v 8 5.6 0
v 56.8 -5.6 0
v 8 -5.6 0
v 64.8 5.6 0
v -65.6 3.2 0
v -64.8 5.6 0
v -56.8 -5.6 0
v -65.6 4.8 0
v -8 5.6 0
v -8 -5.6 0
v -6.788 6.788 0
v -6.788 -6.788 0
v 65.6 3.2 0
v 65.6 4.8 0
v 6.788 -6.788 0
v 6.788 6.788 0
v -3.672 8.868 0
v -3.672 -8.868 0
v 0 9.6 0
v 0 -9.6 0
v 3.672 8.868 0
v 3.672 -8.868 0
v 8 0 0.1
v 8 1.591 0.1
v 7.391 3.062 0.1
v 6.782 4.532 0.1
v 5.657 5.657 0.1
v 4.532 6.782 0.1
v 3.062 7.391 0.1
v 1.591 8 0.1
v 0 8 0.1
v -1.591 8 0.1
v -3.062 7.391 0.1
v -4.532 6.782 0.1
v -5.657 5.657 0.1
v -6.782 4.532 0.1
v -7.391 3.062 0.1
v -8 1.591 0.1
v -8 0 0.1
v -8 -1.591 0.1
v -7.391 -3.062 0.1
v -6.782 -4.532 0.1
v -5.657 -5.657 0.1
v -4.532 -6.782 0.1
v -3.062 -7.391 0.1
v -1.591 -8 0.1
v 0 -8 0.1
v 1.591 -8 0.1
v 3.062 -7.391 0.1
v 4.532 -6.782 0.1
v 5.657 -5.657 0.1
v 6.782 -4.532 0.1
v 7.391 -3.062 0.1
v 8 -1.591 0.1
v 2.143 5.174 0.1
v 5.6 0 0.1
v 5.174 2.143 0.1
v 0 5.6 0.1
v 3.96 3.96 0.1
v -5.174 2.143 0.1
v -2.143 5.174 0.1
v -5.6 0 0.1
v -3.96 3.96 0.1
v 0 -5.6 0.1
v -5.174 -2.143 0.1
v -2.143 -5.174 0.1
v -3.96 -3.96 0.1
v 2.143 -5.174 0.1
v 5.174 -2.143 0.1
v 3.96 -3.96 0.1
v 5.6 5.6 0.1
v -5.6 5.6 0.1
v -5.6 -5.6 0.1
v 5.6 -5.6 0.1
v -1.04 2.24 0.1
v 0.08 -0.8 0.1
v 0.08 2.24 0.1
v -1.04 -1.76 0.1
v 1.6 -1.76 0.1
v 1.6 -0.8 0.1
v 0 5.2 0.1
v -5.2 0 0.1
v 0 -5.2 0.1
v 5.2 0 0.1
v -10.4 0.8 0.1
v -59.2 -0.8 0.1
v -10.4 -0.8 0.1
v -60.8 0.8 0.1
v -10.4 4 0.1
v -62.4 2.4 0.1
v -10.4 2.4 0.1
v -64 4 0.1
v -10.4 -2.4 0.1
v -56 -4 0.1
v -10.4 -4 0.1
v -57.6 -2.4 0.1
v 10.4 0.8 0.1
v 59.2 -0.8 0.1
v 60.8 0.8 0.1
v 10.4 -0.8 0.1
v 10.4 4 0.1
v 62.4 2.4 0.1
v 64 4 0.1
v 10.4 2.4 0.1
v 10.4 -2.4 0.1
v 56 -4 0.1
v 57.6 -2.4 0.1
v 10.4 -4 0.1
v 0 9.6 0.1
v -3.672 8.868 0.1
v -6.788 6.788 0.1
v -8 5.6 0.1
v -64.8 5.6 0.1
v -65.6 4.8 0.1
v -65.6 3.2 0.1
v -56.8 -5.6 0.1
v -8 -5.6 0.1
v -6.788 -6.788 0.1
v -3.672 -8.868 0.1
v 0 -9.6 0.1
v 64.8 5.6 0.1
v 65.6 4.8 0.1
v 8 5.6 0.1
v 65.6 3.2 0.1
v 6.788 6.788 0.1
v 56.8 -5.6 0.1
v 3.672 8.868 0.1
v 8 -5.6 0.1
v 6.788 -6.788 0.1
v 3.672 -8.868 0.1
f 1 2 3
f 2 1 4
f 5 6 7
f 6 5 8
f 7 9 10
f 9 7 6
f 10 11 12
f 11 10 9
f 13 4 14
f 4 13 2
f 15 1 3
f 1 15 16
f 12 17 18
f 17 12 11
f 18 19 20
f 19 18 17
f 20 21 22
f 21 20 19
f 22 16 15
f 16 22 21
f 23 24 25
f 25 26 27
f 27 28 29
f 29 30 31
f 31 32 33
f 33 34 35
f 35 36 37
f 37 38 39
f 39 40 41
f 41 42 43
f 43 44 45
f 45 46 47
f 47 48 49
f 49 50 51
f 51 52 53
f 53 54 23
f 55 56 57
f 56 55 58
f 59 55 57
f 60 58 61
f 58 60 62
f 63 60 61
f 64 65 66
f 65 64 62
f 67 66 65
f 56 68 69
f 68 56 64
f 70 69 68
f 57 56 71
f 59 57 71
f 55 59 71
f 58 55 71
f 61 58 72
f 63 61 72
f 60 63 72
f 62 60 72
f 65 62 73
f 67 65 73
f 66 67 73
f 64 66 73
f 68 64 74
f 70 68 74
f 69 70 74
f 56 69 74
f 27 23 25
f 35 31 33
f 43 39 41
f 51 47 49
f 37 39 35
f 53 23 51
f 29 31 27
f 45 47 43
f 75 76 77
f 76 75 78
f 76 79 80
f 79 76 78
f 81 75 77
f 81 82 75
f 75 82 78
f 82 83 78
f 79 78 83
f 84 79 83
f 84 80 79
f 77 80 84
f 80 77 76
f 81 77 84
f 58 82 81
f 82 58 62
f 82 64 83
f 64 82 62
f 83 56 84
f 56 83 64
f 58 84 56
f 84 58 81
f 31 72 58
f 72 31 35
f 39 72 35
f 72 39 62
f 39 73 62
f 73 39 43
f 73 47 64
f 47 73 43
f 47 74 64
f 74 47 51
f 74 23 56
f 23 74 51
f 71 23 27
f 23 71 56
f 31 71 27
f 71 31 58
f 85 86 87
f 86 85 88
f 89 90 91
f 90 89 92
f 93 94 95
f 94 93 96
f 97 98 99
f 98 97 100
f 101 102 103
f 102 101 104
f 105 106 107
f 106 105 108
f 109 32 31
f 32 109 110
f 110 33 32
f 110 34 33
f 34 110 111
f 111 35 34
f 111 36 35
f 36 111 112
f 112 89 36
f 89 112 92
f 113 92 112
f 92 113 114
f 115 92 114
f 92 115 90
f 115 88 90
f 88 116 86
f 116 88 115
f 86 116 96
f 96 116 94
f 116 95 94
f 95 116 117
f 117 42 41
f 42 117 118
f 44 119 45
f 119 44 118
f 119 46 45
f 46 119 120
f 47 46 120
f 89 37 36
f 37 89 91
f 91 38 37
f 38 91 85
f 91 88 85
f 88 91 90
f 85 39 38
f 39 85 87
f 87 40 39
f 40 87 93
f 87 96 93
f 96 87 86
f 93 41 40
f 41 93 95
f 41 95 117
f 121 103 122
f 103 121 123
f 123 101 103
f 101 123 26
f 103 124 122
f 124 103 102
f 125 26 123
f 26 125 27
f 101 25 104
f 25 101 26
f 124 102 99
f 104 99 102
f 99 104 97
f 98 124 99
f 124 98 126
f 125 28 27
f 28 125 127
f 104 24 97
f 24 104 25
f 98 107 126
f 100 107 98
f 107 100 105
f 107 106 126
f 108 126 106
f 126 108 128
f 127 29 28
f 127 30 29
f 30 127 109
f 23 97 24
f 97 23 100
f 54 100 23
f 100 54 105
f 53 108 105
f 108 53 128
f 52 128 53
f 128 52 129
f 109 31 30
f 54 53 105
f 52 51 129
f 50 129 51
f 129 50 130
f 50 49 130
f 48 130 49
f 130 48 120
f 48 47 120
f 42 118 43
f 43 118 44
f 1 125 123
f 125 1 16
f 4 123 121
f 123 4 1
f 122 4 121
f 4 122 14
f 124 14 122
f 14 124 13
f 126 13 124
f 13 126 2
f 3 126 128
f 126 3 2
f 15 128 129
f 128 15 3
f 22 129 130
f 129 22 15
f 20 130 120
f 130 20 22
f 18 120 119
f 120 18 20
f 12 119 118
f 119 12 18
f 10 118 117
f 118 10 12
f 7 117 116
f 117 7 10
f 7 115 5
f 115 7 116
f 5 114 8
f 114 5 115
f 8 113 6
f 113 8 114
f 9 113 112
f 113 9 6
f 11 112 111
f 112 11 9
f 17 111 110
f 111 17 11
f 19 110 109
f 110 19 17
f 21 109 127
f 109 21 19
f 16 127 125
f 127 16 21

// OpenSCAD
// file: ../p/4-4ndis.scad
use <../lib.scad>
function ldraw_lib__4_4ndis() = [
// 0 Disc Negative 1.0
// 0 Name: 4-4ndis.dat
// 0 Author: James Jessiman
// 0 !LDRAW_ORG Primitive UPDATE 2012-01
// 0 !LICENSE Licensed under CC BY 4.0 : see CAreadme.txt
// 
// 0 BFC CERTIFY CCW
  [0,"BFC","CERTIFY"],
  [0,"BFC","CCW"],
// 
// 0 !HISTORY 2002-03-23 [sbliss] Added BFC statement; compacted code
// 0 !HISTORY 2002-04-25 [PTadmin] Official Update 2002-02
// 0 !HISTORY 2007-06-24 [PTadmin] Header formatted for Contributor Agreement
// 0 !HISTORY 2008-07-01 [PTadmin] Official Update 2008-01
// 0 !HISTORY 2012-02-16 [Philo] Changed to CCW
// 0 !HISTORY 2012-03-30 [PTadmin] Official Update 2012-01
// 
// 
// 3 16 0.9239 0 0.3827 1 0 0 1 0 1
  [3,16,0.9239,0,0.3827,1,0,0,1,0,1],
// 3 16 0.7071 0 0.7071 0.9239 0 0.3827 1 0 1
  [3,16,0.7071,0,0.7071,0.9239,0,0.3827,1,0,1],
// 3 16 0.3827 0 0.9239 0.7071 0 0.7071 1 0 1
  [3,16,0.3827,0,0.9239,0.7071,0,0.7071,1,0,1],
// 3 16 0 0 1 0.3827 0 0.9239 1 0 1
  [3,16,0,0,1,0.3827,0,0.9239,1,0,1],
// 3 16 -0.3827 0 0.9239 0 0 1 -1 0 1
  [3,16,-0.3827,0,0.9239,0,0,1,-1,0,1],
// 3 16 -0.7071 0 0.7071 -0.3827 0 0.9239 -1 0 1
  [3,16,-0.7071,0,0.7071,-0.3827,0,0.9239,-1,0,1],
// 3 16 -0.9239 0 0.3827 -0.7071 0 0.7071 -1 0 1
  [3,16,-0.9239,0,0.3827,-0.7071,0,0.7071,-1,0,1],
// 3 16 -1 0 0 -0.9239 0 0.3827 -1 0 1
  [3,16,-1,0,0,-0.9239,0,0.3827,-1,0,1],
// 3 16 -0.9239 0 -0.3827 -1 0 0 -1 0 -1
  [3,16,-0.9239,0,-0.3827,-1,0,0,-1,0,-1],
// 3 16 -0.7071 0 -0.7071 -0.9239 0 -0.3827 -1 0 -1
  [3,16,-0.7071,0,-0.7071,-0.9239,0,-0.3827,-1,0,-1],
// 3 16 -0.3827 0 -0.9239 -0.7071 0 -0.7071 -1 0 -1
  [3,16,-0.3827,0,-0.9239,-0.7071,0,-0.7071,-1,0,-1],
// 3 16 0 0 -1 -0.3827 0 -0.9239 -1 0 -1
  [3,16,0,0,-1,-0.3827,0,-0.9239,-1,0,-1],
// 3 16 0.3827 0 -0.9239 0 0 -1 1 0 -1
  [3,16,0.3827,0,-0.9239,0,0,-1,1,0,-1],
// 3 16 0.7071 0 -0.7071 0.3827 0 -0.9239 1 0 -1
  [3,16,0.7071,0,-0.7071,0.3827,0,-0.9239,1,0,-1],
// 3 16 0.9239 0 -0.3827 0.7071 0 -0.7071 1 0 -1
  [3,16,0.9239,0,-0.3827,0.7071,0,-0.7071,1,0,-1],
// 3 16 1 0 0 0.9239 0 -0.3827 1 0 -1
  [3,16,1,0,0,0.9239,0,-0.3827,1,0,-1],
];
module ldraw_lib__4_4ndis(step=0, col=false, unit=2/5, alt=false, line=0.2, solid=!$preview)
    makepoly(ldraw_lib__4_4ndis(), step=step, col=col, unit=unit, alt=alt, line=line, solid=solid);
ldraw_lib__4_4ndis(line=0.2);
// file: ../p/1-8chrd.scad
use <../lib.scad>
function ldraw_lib__1_8chrd() = [
// 0 Chord 0.125
// 0 Name: 1-8chrd.dat
// 0 Author: Orion Pobursky [OrionP]
// 0 !LDRAW_ORG Primitive UPDATE 2023-05
// 0 !LICENSE Licensed under CC BY 4.0 : see CAreadme.txt
// 
// 0 BFC CERTIFY CCW
  [0,"BFC","CERTIFY"],
  [0,"BFC","CCW"],
// 
// 0 !HISTORY 2004-04-22 [PTadmin] Official Update 2004-02
// 0 !HISTORY 2007-06-22 [PTadmin] Header formatted for Contributor Agreement
// 0 !HISTORY 2008-07-01 [PTadmin] Official Update 2008-01
// 0 !HISTORY 2023-10-27 [OrionP] Rebuilt with PrimGen2, original author westrate
// 0 !HISTORY 2023-10-31 [OrionP] Official Update 2023-05
// 
// 3 16 1 0 0 0.9239 0 0.3827 0.7071 0 0.7071
  [3,16,1,0,0,0.9239,0,0.3827,0.7071,0,0.7071],
];
module ldraw_lib__1_8chrd(step=0, col=false, unit=2/5, alt=false, line=0.2, solid=!$preview)
    makepoly(ldraw_lib__1_8chrd(), step=step, col=col, unit=unit, alt=alt, line=line, solid=solid);
ldraw_lib__1_8chrd(line=0.2);
// file: ../p/1-4tang.scad
use <../lib.scad>
function ldraw_lib__1_4tang() = [
// 0 Disc Negative Tangent 0.25
// 0 Name: 1-4tang.dat
// 0 Author: Willy Tschager [Holly-Wood]
// 0 !LDRAW_ORG Primitive UPDATE 2024-01
// 0 !LICENSE Licensed under CC BY 4.0 : see CAreadme.txt
// 
// 0 BFC CERTIFY CCW
  [0,"BFC","CERTIFY"],
  [0,"BFC","CCW"],
// 
// 0 !HISTORY 2011-12-29 [PTadmin] Official Update 2011-02
// 0 !HISTORY 2024-01-08 [Holly-Wood] Complete re-write, original by westrate
// 0 !HISTORY 2024-01-29 [OrionP] Official Update 2024-01
// 
// 3 16 0 0 1 0.3827 0 0.9239 0.1989 0 1
  [3,16,0,0,1,0.3827,0,0.9239,0.1989,0,1],
// 3 16 0.3827 0 0.9239 0.7071 0 0.7071 0.5665 0 0.8478
  [3,16,0.3827,0,0.9239,0.7071,0,0.7071,0.5665,0,0.8478],
// 3 16 0.7071 0 0.7071 0.9239 0 0.3827 0.8478 0 0.5665
  [3,16,0.7071,0,0.7071,0.9239,0,0.3827,0.8478,0,0.5665],
// 3 16 0.9239 0 0.3827 1 0 0 1 0 0.1989
  [3,16,0.9239,0,0.3827,1,0,0,1,0,0.1989],
];
module ldraw_lib__1_4tang(step=0, col=false, unit=2/5, alt=false, line=0.2, solid=!$preview)
    makepoly(ldraw_lib__1_4tang(), step=step, col=col, unit=unit, alt=alt, line=line, solid=solid);
ldraw_lib__1_4tang(line=0.2);
// file: ../p/1-4chrd.scad
use <../lib.scad>
function ldraw_lib__1_4chrd() = [
// 0 Chord 0.25
// 0 Name: 1-4chrd.dat
// 0 Author: Max Martin Richter [MMR1988]
// 0 !LDRAW_ORG Primitive UPDATE 2023-05
// 0 !LICENSE Licensed under CC BY 4.0 : see CAreadme.txt
// 
// 0 BFC CERTIFY CCW
  [0,"BFC","CERTIFY"],
  [0,"BFC","CCW"],
// 
// 0 !HISTORY 2004-04-22 [PTadmin] Official Update 2004-02
// 0 !HISTORY 2007-10-09 [PTadmin] Header formatted for Contributor Agreement
// 0 !HISTORY 2008-07-01 [PTadmin] Official Update 2008-01
// 0 !HISTORY 2012-08-02 [MMR1988] Re-creation with PrimGen2 and Rectifier
// 0 !HISTORY 2012-08-09 [PTadmin] Official Update 2012-02
// 0 !HISTORY 2023-10-27 [OrionP] Change author to MMR1988 from hafhead
// 0 !HISTORY 2023-10-31 [OrionP] Official Update 2023-05
// 
// 4 16 0.9239 0 0.3827 0.3827 0 0.9239 0 0 1 1 0 0
  [4,16,0.9239,0,0.3827,0.3827,0,0.9239,0,0,1,1,0,0],
// 3 16 0.7071 0 0.7071 0.3827 0 0.9239 0.9239 0 0.3827
  [3,16,0.7071,0,0.7071,0.3827,0,0.9239,0.9239,0,0.3827],
];
module ldraw_lib__1_4chrd(step=0, col=false, unit=2/5, alt=false, line=0.2, solid=!$preview)
    makepoly(ldraw_lib__1_4chrd(), step=step, col=col, unit=unit, alt=alt, line=line, solid=solid);
ldraw_lib__1_4chrd(line=0.2);
// main file
use <../lib.scad>
use <../p/1-4chrd.scad>
use <../p/1-4tang.scad>
use <../p/1-8chrd.scad>
use <../p/4-4ndis.scad>
function ldraw_lib__197895a() = [
// 0 Sticker  2.5 x 16.4 with White Stripes and Red "L" in White/Black/Yellow Logo
// 0 Name: 197895a.dat
// 0 Author: Takeshi Takahashi [RainbowDolphin]
// 0 !LDRAW_ORG Part UPDATE 2025-08
// 0 !LICENSE Licensed under CC BY 4.0 : see CAreadme.txt
// 
// 0 BFC CERTIFY CCW
  [0,"BFC","CERTIFY"],
  [0,"BFC","CCW"],
// 
// 0 !KEYWORDS boat, Cargo, Freighter, Set 4030, ship
// 
// 0 !HISTORY 2025-08-31 [OrionP] Official Update 2025-08
// 
// 
// 4 16 142 0 -14 20 0 -14 20 0 14 162 0 14
  [4,16,142,0,-14,20,0,-14,20,0,14,162,0,14],
// 4 16 -164 0 12 -162 0 14 -142 0 -14 -164 0 8
  [4,16,-164,0,12,-162,0,14,-142,0,-14,-164,0,8],
// 4 16 -142 0 -14 -162 0 14 -20 0 14 -20 0 -14
  [4,16,-142,0,-14,-162,0,14,-20,0,14,-20,0,-14],
// 4 16 -20 0 14 -16.97 0 16.97 -16.97 0 -16.97 -20 0 -14
  [4,16,-20,0,14,-16.97,0,16.97,-16.97,0,-16.97,-20,0,-14],
// 4 16 142 0 -14 162 0 14 164 0 12 164 0 8
  [4,16,142,0,-14,162,0,14,164,0,12,164,0,8],
// 4 16 16.97 0 16.97 20 0 14 20 0 -14 16.97 0 -16.97
  [4,16,16.97,0,16.97,20,0,14,20,0,-14,16.97,0,-16.97],
// 4 16 -16.97 0 -16.97 -16.97 0 16.97 -9.18 0 22.17 -9.18 0 -22.17
  [4,16,-16.97,0,-16.97,-16.97,0,16.97,-9.18,0,22.17,-9.18,0,-22.17],
// 4 16 0 0 24 0 0 -24 -9.18 0 -22.17 -9.18 0 22.17
  [4,16,0,0,24,0,0,-24,-9.18,0,-22.17,-9.18,0,22.17],
// 4 16 9.18 0 22.17 9.18 0 -22.17 0 0 -24 0 0 24
  [4,16,9.18,0,22.17,9.18,0,-22.17,0,0,-24,0,0,24],
// 4 16 9.18 0 -22.17 9.18 0 22.17 16.97 0 16.97 16.97 0 -16.97
  [4,16,9.18,0,-22.17,9.18,0,22.17,16.97,0,16.97,16.97,0,-16.97],
// 1 16 0 -.25 0 20 0 0 0 1 0 0 0 20 1-4tang.dat
  [1,16,0,-.25,0,20,0,0,0,1,0,0,0,20, ldraw_lib__1_4tang()],
// 1 16 0 -.25 0 0 0 -20 0 1 0 20 0 0 1-4tang.dat
  [1,16,0,-.25,0,0,0,-20,0,1,0,20,0,0, ldraw_lib__1_4tang()],
// 1 16 0 -.25 0 -20 0 0 0 1 0 0 0 -20 1-4tang.dat
  [1,16,0,-.25,0,-20,0,0,0,1,0,0,0,-20, ldraw_lib__1_4tang()],
// 1 16 0 -.25 0 0 0 20 0 1 0 -20 0 0 1-4tang.dat
  [1,16,0,-.25,0,0,0,20,0,1,0,-20,0,0, ldraw_lib__1_4tang()],
// 0 BFC NOCLIP
  [0,"BFC","NOCLIP"],
// 1 0 0 -.25 0 14 0 0 0 1 0 0 0 14 1-4chrd.dat
  [1,0,0,-.25,0,14,0,0,0,1,0,0,0,14, ldraw_lib__1_4chrd()],
// 1 0 0 -.25 0 0 0 -14 0 1 0 14 0 0 1-4chrd.dat
  [1,0,0,-.25,0,0,0,-14,0,1,0,14,0,0, ldraw_lib__1_4chrd()],
// 1 0 0 -.25 0 -14 0 0 0 1 0 0 0 -14 1-4chrd.dat
  [1,0,0,-.25,0,-14,0,0,0,1,0,0,0,-14, ldraw_lib__1_4chrd()],
// 1 0 0 -.25 0 0 0 14 0 1 0 -14 0 0 1-4chrd.dat
  [1,0,0,-.25,0,0,0,14,0,1,0,-14,0,0, ldraw_lib__1_4chrd()],
// 1 14 0 -.25 0 14 0 0 0 1 0 0 0 14 4-4ndis.dat
  [1,14,0,-.25,0,14,0,0,0,1,0,0,0,14, ldraw_lib__4_4ndis()],
// 1 14 0 -.25 0 20 0 0 0 1 0 0 0 20 1-8chrd.dat
  [1,14,0,-.25,0,20,0,0,0,1,0,0,0,20, ldraw_lib__1_8chrd()],
// 1 14 0 -.25 0 0 0 -20 0 1 0 20 0 0 1-8chrd.dat
  [1,14,0,-.25,0,0,0,-20,0,1,0,20,0,0, ldraw_lib__1_8chrd()],
// 1 14 0 -.25 0 -20 0 0 0 1 0 0 0 -20 1-8chrd.dat
  [1,14,0,-.25,0,-20,0,0,0,1,0,0,0,-20, ldraw_lib__1_8chrd()],
// 1 14 0 -.25 0 0 0 20 0 1 0 -20 0 0 1-8chrd.dat
  [1,14,0,-.25,0,0,0,20,0,1,0,-20,0,0, ldraw_lib__1_8chrd()],
// 1 14 0 -.25 0 -20 0 0 0 1 0 0 0 20 1-8chrd.dat
  [1,14,0,-.25,0,-20,0,0,0,1,0,0,0,20, ldraw_lib__1_8chrd()],
// 1 14 0 -.25 0 20 0 0 0 1 0 0 0 -20 1-8chrd.dat
  [1,14,0,-.25,0,20,0,0,0,1,0,0,0,-20, ldraw_lib__1_8chrd()],
// 1 14 0 -.25 0 0 0 20 0 1 0 20 0 0 1-8chrd.dat
  [1,14,0,-.25,0,0,0,20,0,1,0,20,0,0, ldraw_lib__1_8chrd()],
// 1 14 0 -.25 0 0 0 -20 0 1 0 -20 0 0 1-8chrd.dat
  [1,14,0,-.25,0,0,0,-20,0,1,0,-20,0,0, ldraw_lib__1_8chrd()],
// 4 4 .2 -.25 -2 .2 -.25 5.6 -2.6 -.25 5.6 -2.6 -.25 -4.4
  [4,4,.2,-.25,-2,.2,-.25,5.6,-2.6,-.25,5.6,-2.6,-.25,-4.4],
// 4 4 .2 -.25 -2 -2.6 -.25 -4.4 4 -.25 -4.4 4 -.25 -2
  [4,4,.2,-.25,-2,-2.6,-.25,-4.4,4,-.25,-4.4,4,-.25,-2],
// 3 15 0 -.25 13 -2.6 -.25 5.6 .2 -.25 5.6
  [3,15,0,-.25,13,-2.6,-.25,5.6,.2,-.25,5.6],
// 3 15 0 -.25 13 -13 -.25 0 -2.6 -.25 5.6
  [3,15,0,-.25,13,-13,-.25,0,-2.6,-.25,5.6],
// 3 15 -2.6 -.25 5.6 -13 -.25 0 -2.6 -.25 -4.4
  [3,15,-2.6,-.25,5.6,-13,-.25,0,-2.6,-.25,-4.4],
// 3 15 -13 -.25 0 0 -.25 -13 -2.6 -.25 -4.4
  [3,15,-13,-.25,0,0,-.25,-13,-2.6,-.25,-4.4],
// 3 15 4 -.25 -4.4 -2.6 -.25 -4.4 0 -.25 -13
  [3,15,4,-.25,-4.4,-2.6,-.25,-4.4,0,-.25,-13],
// 3 15 13 -.25 0 4 -.25 -4.4 0 -.25 -13
  [3,15,13,-.25,0,4,-.25,-4.4,0,-.25,-13],
// 3 15 13 -.25 0 4 -.25 -2 4 -.25 -4.4
  [3,15,13,-.25,0,4,-.25,-2,4,-.25,-4.4],
// 4 15 4 -.25 -2 13 -.25 0 .2 -.25 5.6 .2 -.25 -2
  [4,15,4,-.25,-2,13,-.25,0,.2,-.25,5.6,.2,-.25,-2],
// 3 15 0 -.25 13 .2 -.25 5.6 13 -.25 0
  [3,15,0,-.25,13,.2,-.25,5.6,13,-.25,0],
// 4 0 -13 -.25 0 0 -.25 13 0 -.25 14 -14 -.25 0
  [4,0,-13,-.25,0,0,-.25,13,0,-.25,14,-14,-.25,0],
// 4 0 0 -.25 -13 -13 -.25 0 -14 -.25 0 0 -.25 -14
  [4,0,0,-.25,-13,-13,-.25,0,-14,-.25,0,0,-.25,-14],
// 4 0 13 -.25 0 0 -.25 -13 0 -.25 -14 14 -.25 0
  [4,0,13,-.25,0,0,-.25,-13,0,-.25,-14,14,-.25,0],
// 4 0 0 -.25 13 13 -.25 0 14 -.25 0 0 -.25 14
  [4,0,0,-.25,13,13,-.25,0,14,-.25,0,0,-.25,14],
// 4 14 0 -.25 14 0 -.25 20 -14.142 -.25 14.142 -14 -.25 14
  [4,14,0,-.25,14,0,-.25,20,-14.142,-.25,14.142,-14,-.25,14],
// 4 14 -14 -.25 0 -14 -.25 14 -14.142 -.25 14.142 -20 -.25 0
  [4,14,-14,-.25,0,-14,-.25,14,-14.142,-.25,14.142,-20,-.25,0],
// 4 14 -14.142 -.25 -14.142 -14 -.25 -14 -14 -.25 0 -20 -.25 0
  [4,14,-14.142,-.25,-14.142,-14,-.25,-14,-14,-.25,0,-20,-.25,0],
// 4 14 0 -.25 -14 -14 -.25 -14 -14.142 -.25 -14.142 0 -.25 -20
  [4,14,0,-.25,-14,-14,-.25,-14,-14.142,-.25,-14.142,0,-.25,-20],
// 4 14 0 -.25 -14 0 -.25 -20 14.142 -.25 -14.142 14 -.25 -14
  [4,14,0,-.25,-14,0,-.25,-20,14.142,-.25,-14.142,14,-.25,-14],
// 4 14 14 -.25 -14 14.142 -.25 -14.142 20 -.25 0 14 -.25 0
  [4,14,14,-.25,-14,14.142,-.25,-14.142,20,-.25,0,14,-.25,0],
// 4 14 14 -.25 0 20 -.25 0 14.142 -.25 14.142 14 -.25 14
  [4,14,14,-.25,0,20,-.25,0,14.142,-.25,14.142,14,-.25,14],
// 4 14 0 -.25 14 14 -.25 14 14.142 -.25 14.142 0 -.25 20
  [4,14,0,-.25,14,14,-.25,14,14.142,-.25,14.142,0,-.25,20],
// 4 15 -148 -.25 -2 -26 -.25 -2 -26 -.25 2 -152 -.25 2
  [4,15,-148,-.25,-2,-26,-.25,-2,-26,-.25,2,-152,-.25,2],
// 4 15 -156 -.25 6 -26 -.25 6 -26 -.25 10 -160 -.25 10
  [4,15,-156,-.25,6,-26,-.25,6,-26,-.25,10,-160,-.25,10],
// 4 15 -26 -.25 -10 -26 -.25 -6 -144 -.25 -6 -140 -.25 -10
  [4,15,-26,-.25,-10,-26,-.25,-6,-144,-.25,-6,-140,-.25,-10],
// 4 15 26 -.25 2 26 -.25 -2 148 -.25 -2 152 -.25 2
  [4,15,26,-.25,2,26,-.25,-2,148,-.25,-2,152,-.25,2],
// 4 15 26 -.25 10 26 -.25 6 156 -.25 6 160 -.25 10
  [4,15,26,-.25,10,26,-.25,6,156,-.25,6,160,-.25,10],
// 4 15 144 -.25 -6 26 -.25 -6 26 -.25 -10 140 -.25 -10
  [4,15,144,-.25,-6,26,-.25,-6,26,-.25,-10,140,-.25,-10],
// 0 BFC CLIP
  [0,"BFC","CLIP"],
// 4 16 -3.978 -.25 20 0 -.25 20 0 -.25 24 -9.18 -.25 22.17
  [4,16,-3.978,-.25,20,0,-.25,20,0,-.25,24,-9.18,-.25,22.17],
// 3 16 -9.18 -.25 22.17 -7.654 -.25 18.478 -3.978 -.25 20
  [3,16,-9.18,-.25,22.17,-7.654,-.25,18.478,-3.978,-.25,20],
// 4 16 -11.33 -.25 16.956 -7.654 -.25 18.478 -9.18 -.25 22.17 -16.97 -.25 16.97
  [4,16,-11.33,-.25,16.956,-7.654,-.25,18.478,-9.18,-.25,22.17,-16.97,-.25,16.97],
// 3 16 -16.97 -.25 16.97 -14.142 -.25 14.142 -11.33 -.25 16.956
  [3,16,-16.97,-.25,16.97,-14.142,-.25,14.142,-11.33,-.25,16.956],
// 4 16 -16.97 -.25 16.97 -20 -.25 14 -16.956 -.25 11.33 -14.142 -.25 14.142
  [4,16,-16.97,-.25,16.97,-20,-.25,14,-16.956,-.25,11.33,-14.142,-.25,14.142],
// 4 16 -26 -.25 10 -16.956 -.25 11.33 -20 -.25 14 -160 -.25 10
  [4,16,-26,-.25,10,-16.956,-.25,11.33,-20,-.25,14,-160,-.25,10],
// 4 16 -160 -.25 10 -20 -.25 14 -162 -.25 14 -164 -.25 12
  [4,16,-160,-.25,10,-20,-.25,14,-162,-.25,14,-164,-.25,12],
// 4 16 -164 -.25 8 -156 -.25 6 -160 -.25 10 -164 -.25 12
  [4,16,-164,-.25,8,-156,-.25,6,-160,-.25,10,-164,-.25,12],
// 3 16 -164 -.25 8 -152 -.25 2 -156 -.25 6
  [3,16,-164,-.25,8,-152,-.25,2,-156,-.25,6],
// 4 16 -148 -.25 -2 -152 -.25 2 -164 -.25 8 -142 -.25 -14
  [4,16,-148,-.25,-2,-152,-.25,2,-164,-.25,8,-142,-.25,-14],
// 3 16 -148 -.25 -2 -142 -.25 -14 -144 -.25 -6
  [3,16,-148,-.25,-2,-142,-.25,-14,-144,-.25,-6],
// 3 16 -144 -.25 -6 -142 -.25 -14 -140 -.25 -10
  [3,16,-144,-.25,-6,-142,-.25,-14,-140,-.25,-10],
// 4 16 -26 -.25 -10 -140 -.25 -10 -142 -.25 -14 -20 -.25 -14
  [4,16,-26,-.25,-10,-140,-.25,-10,-142,-.25,-14,-20,-.25,-14],
// 4 16 -20 -.25 -14 -16.97 -.25 -16.97 -16.956 -.25 -11.33 -18.478 -.25 -7.654
  [4,16,-20,-.25,-14,-16.97,-.25,-16.97,-16.956,-.25,-11.33,-18.478,-.25,-7.654],
// 4 16 -11.33 -.25 -16.956 -16.97 -.25 -16.97 -9.18 -.25 -22.17 -7.654 -.25 -18.478
  [4,16,-11.33,-.25,-16.956,-16.97,-.25,-16.97,-9.18,-.25,-22.17,-7.654,-.25,-18.478],
// 4 16 -3.978 -.25 -20 -7.654 -.25 -18.478 -9.18 -.25 -22.17 0 -.25 -24
  [4,16,-3.978,-.25,-20,-7.654,-.25,-18.478,-9.18,-.25,-22.17,0,-.25,-24],
// 3 16 0 -.25 -20 -3.978 -.25 -20 0 -.25 -24
  [3,16,0,-.25,-20,-3.978,-.25,-20,0,-.25,-24],
// 4 16 -18.478 -.25 7.654 -16.956 -.25 11.33 -26 -.25 10 -26 -.25 6
  [4,16,-18.478,-.25,7.654,-16.956,-.25,11.33,-26,-.25,10,-26,-.25,6],
// 4 16 -20 -.25 3.978 -18.478 -.25 7.654 -26 -.25 6 -26 -.25 2
  [4,16,-20,-.25,3.978,-18.478,-.25,7.654,-26,-.25,6,-26,-.25,2],
// 4 16 -152 -.25 2 -26 -.25 2 -26 -.25 6 -156 -.25 6
  [4,16,-152,-.25,2,-26,-.25,2,-26,-.25,6,-156,-.25,6],
// 4 16 -20 -.25 0 -20 -.25 3.978 -26 -.25 2 -26 -.25 -2
  [4,16,-20,-.25,0,-20,-.25,3.978,-26,-.25,2,-26,-.25,-2],
// 4 16 -20 -.25 -3.978 -20 -.25 0 -26 -.25 -2 -26 -.25 -6
  [4,16,-20,-.25,-3.978,-20,-.25,0,-26,-.25,-2,-26,-.25,-6],
// 4 16 -144 -.25 -6 -26 -.25 -6 -26 -.25 -2 -148 -.25 -2
  [4,16,-144,-.25,-6,-26,-.25,-6,-26,-.25,-2,-148,-.25,-2],
// 4 16 -18.478 -.25 -7.654 -20 -.25 -3.978 -26 -.25 -6 -26 -.25 -10
  [4,16,-18.478,-.25,-7.654,-20,-.25,-3.978,-26,-.25,-6,-26,-.25,-10],
// 3 16 -18.478 -.25 -7.654 -26 -.25 -10 -20 -.25 -14
  [3,16,-18.478,-.25,-7.654,-26,-.25,-10,-20,-.25,-14],
// 4 16 162 -.25 14 20 -.25 14 160 -.25 10 164 -.25 12
  [4,16,162,-.25,14,20,-.25,14,160,-.25,10,164,-.25,12],
// 4 16 26 -.25 10 160 -.25 10 20 -.25 14 16.956 -.25 11.33
  [4,16,26,-.25,10,160,-.25,10,20,-.25,14,16.956,-.25,11.33],
// 4 16 160 -.25 10 156 -.25 6 164 -.25 8 164 -.25 12
  [4,16,160,-.25,10,156,-.25,6,164,-.25,8,164,-.25,12],
// 4 16 16.956 -.25 11.33 20 -.25 14 16.97 -.25 16.97 14.142 -.25 14.142
  [4,16,16.956,-.25,11.33,20,-.25,14,16.97,-.25,16.97,14.142,-.25,14.142],
// 4 16 26 -.25 10 16.956 -.25 11.33 18.478 -.25 7.654 26 -.25 6
  [4,16,26,-.25,10,16.956,-.25,11.33,18.478,-.25,7.654,26,-.25,6],
// 3 16 164 -.25 8 156 -.25 6 152 -.25 2
  [3,16,164,-.25,8,156,-.25,6,152,-.25,2],
// 4 16 152 -.25 2 156 -.25 6 26 -.25 6 26 -.25 2
  [4,16,152,-.25,2,156,-.25,6,26,-.25,6,26,-.25,2],
// 4 16 164 -.25 8 152 -.25 2 148 -.25 -2 142 -.25 -14
  [4,16,164,-.25,8,152,-.25,2,148,-.25,-2,142,-.25,-14],
// 4 16 16.97 -.25 16.97 9.18 -.25 22.17 11.33 -.25 16.956 14.142 -.25 14.142
  [4,16,16.97,-.25,16.97,9.18,-.25,22.17,11.33,-.25,16.956,14.142,-.25,14.142],
// 4 16 26 -.25 6 18.478 -.25 7.654 20 -.25 3.978 26 -.25 2
  [4,16,26,-.25,6,18.478,-.25,7.654,20,-.25,3.978,26,-.25,2],
// 3 16 148 -.25 -2 144 -.25 -6 142 -.25 -14
  [3,16,148,-.25,-2,144,-.25,-6,142,-.25,-14],
// 4 16 144 -.25 -6 148 -.25 -2 26 -.25 -2 26 -.25 -6
  [4,16,144,-.25,-6,148,-.25,-2,26,-.25,-2,26,-.25,-6],
// 3 16 144 -.25 -6 140 -.25 -10 142 -.25 -14
  [3,16,144,-.25,-6,140,-.25,-10,142,-.25,-14],
// 4 16 142 -.25 -14 140 -.25 -10 26 -.25 -10 20 -.25 -14
  [4,16,142,-.25,-14,140,-.25,-10,26,-.25,-10,20,-.25,-14],
// 3 16 9.18 -.25 22.17 7.654 -.25 18.478 11.33 -.25 16.956
  [3,16,9.18,-.25,22.17,7.654,-.25,18.478,11.33,-.25,16.956],
// 4 16 9.18 -.25 22.17 0 -.25 24 3.978 -.25 20 7.654 -.25 18.478
  [4,16,9.18,-.25,22.17,0,-.25,24,3.978,-.25,20,7.654,-.25,18.478],
// 4 16 26 -.25 2 20 -.25 3.978 20 -.25 0 26 -.25 -2
  [4,16,26,-.25,2,20,-.25,3.978,20,-.25,0,26,-.25,-2],
// 4 16 26 -.25 -2 20 -.25 0 20 -.25 -3.978 26 -.25 -6
  [4,16,26,-.25,-2,20,-.25,0,20,-.25,-3.978,26,-.25,-6],
// 4 16 26 -.25 -10 26 -.25 -6 18.478 -.25 -7.654 20 -.25 -14
  [4,16,26,-.25,-10,26,-.25,-6,18.478,-.25,-7.654,20,-.25,-14],
// 4 16 16.956 -.25 -11.33 16.97 -.25 -16.97 20 -.25 -14 18.478 -.25 -7.654
  [4,16,16.956,-.25,-11.33,16.97,-.25,-16.97,20,-.25,-14,18.478,-.25,-7.654],
// 3 16 0 -.25 24 0 -.25 20 3.978 -.25 20
  [3,16,0,-.25,24,0,-.25,20,3.978,-.25,20],
// 3 16 20 -.25 -3.978 18.478 -.25 -7.654 26 -.25 -6
  [3,16,20,-.25,-3.978,18.478,-.25,-7.654,26,-.25,-6],
// 3 16 16.956 -.25 -11.33 14.142 -.25 -14.142 16.97 -.25 -16.97
  [3,16,16.956,-.25,-11.33,14.142,-.25,-14.142,16.97,-.25,-16.97],
// 4 16 16.97 -.25 -16.97 14.142 -.25 -14.142 11.33 -.25 -16.956 9.18 -.25 -22.17
  [4,16,16.97,-.25,-16.97,14.142,-.25,-14.142,11.33,-.25,-16.956,9.18,-.25,-22.17],
// 3 16 11.33 -.25 -16.956 7.654 -.25 -18.478 9.18 -.25 -22.17
  [3,16,11.33,-.25,-16.956,7.654,-.25,-18.478,9.18,-.25,-22.17],
// 4 16 9.18 -.25 -22.17 7.654 -.25 -18.478 3.978 -.25 -20 0 -.25 -24
  [4,16,9.18,-.25,-22.17,7.654,-.25,-18.478,3.978,-.25,-20,0,-.25,-24],
// 3 16 3.978 -.25 -20 0 -.25 -20 0 -.25 -24
  [3,16,3.978,-.25,-20,0,-.25,-20,0,-.25,-24],
// 3 16 -16.956 -.25 -11.33 -16.97 -.25 -16.97 -14.142 -.25 -14.142
  [3,16,-16.956,-.25,-11.33,-16.97,-.25,-16.97,-14.142,-.25,-14.142],
// 3 16 -14.142 -.25 -14.142 -16.97 -.25 -16.97 -11.33 -.25 -16.956
  [3,16,-14.142,-.25,-14.142,-16.97,-.25,-16.97,-11.33,-.25,-16.956],
// 4 16 20 -.25 14 20 0 14 16.97 0 16.97 16.97 -.25 16.97
  [4,16,20,-.25,14,20,0,14,16.97,0,16.97,16.97,-.25,16.97],
// 4 16 162 -.25 14 162 0 14 20 0 14 20 -.25 14
  [4,16,162,-.25,14,162,0,14,20,0,14,20,-.25,14],
// 4 16 164 -.25 12 164 0 12 162 0 14 162 -.25 14
  [4,16,164,-.25,12,164,0,12,162,0,14,162,-.25,14],
// 4 16 164 -.25 8 164 0 8 164 0 12 164 -.25 12
  [4,16,164,-.25,8,164,0,8,164,0,12,164,-.25,12],
// 4 16 142 -.25 -14 142 0 -14 164 0 8 164 -.25 8
  [4,16,142,-.25,-14,142,0,-14,164,0,8,164,-.25,8],
// 4 16 20 -.25 -14 20 0 -14 142 0 -14 142 -.25 -14
  [4,16,20,-.25,-14,20,0,-14,142,0,-14,142,-.25,-14],
// 4 16 16.97 -.25 -16.97 16.97 0 -16.97 20 0 -14 20 -.25 -14
  [4,16,16.97,-.25,-16.97,16.97,0,-16.97,20,0,-14,20,-.25,-14],
// 4 16 9.18 -.25 -22.17 9.18 0 -22.17 16.97 0 -16.97 16.97 -.25 -16.97
  [4,16,9.18,-.25,-22.17,9.18,0,-22.17,16.97,0,-16.97,16.97,-.25,-16.97],
// 4 16 0 -.25 -24 0 0 -24 9.18 0 -22.17 9.18 -.25 -22.17
  [4,16,0,-.25,-24,0,0,-24,9.18,0,-22.17,9.18,-.25,-22.17],
// 4 16 -9.18 -.25 -22.17 -9.18 0 -22.17 0 0 -24 0 -.25 -24
  [4,16,-9.18,-.25,-22.17,-9.18,0,-22.17,0,0,-24,0,-.25,-24],
// 4 16 -16.97 -.25 -16.97 -16.97 0 -16.97 -9.18 0 -22.17 -9.18 -.25 -22.17
  [4,16,-16.97,-.25,-16.97,-16.97,0,-16.97,-9.18,0,-22.17,-9.18,-.25,-22.17],
// 4 16 -20 -.25 -14 -20 0 -14 -16.97 0 -16.97 -16.97 -.25 -16.97
  [4,16,-20,-.25,-14,-20,0,-14,-16.97,0,-16.97,-16.97,-.25,-16.97],
// 4 16 -142 -.25 -14 -142 0 -14 -20 0 -14 -20 -.25 -14
  [4,16,-142,-.25,-14,-142,0,-14,-20,0,-14,-20,-.25,-14],
// 4 16 -164 -.25 8 -164 0 8 -142 0 -14 -142 -.25 -14
  [4,16,-164,-.25,8,-164,0,8,-142,0,-14,-142,-.25,-14],
// 4 16 -164 -.25 12 -164 0 12 -164 0 8 -164 -.25 8
  [4,16,-164,-.25,12,-164,0,12,-164,0,8,-164,-.25,8],
// 4 16 -162 -.25 14 -162 0 14 -164 0 12 -164 -.25 12
  [4,16,-162,-.25,14,-162,0,14,-164,0,12,-164,-.25,12],
// 4 16 -20 -.25 14 -20 0 14 -162 0 14 -162 -.25 14
  [4,16,-20,-.25,14,-20,0,14,-162,0,14,-162,-.25,14],
// 4 16 -16.97 -.25 16.97 -16.97 0 16.97 -20 0 14 -20 -.25 14
  [4,16,-16.97,-.25,16.97,-16.97,0,16.97,-20,0,14,-20,-.25,14],
// 4 16 -9.18 -.25 22.17 -9.18 0 22.17 -16.97 0 16.97 -16.97 -.25 16.97
  [4,16,-9.18,-.25,22.17,-9.18,0,22.17,-16.97,0,16.97,-16.97,-.25,16.97],
// 4 16 0 -.25 24 0 0 24 -9.18 0 22.17 -9.18 -.25 22.17
  [4,16,0,-.25,24,0,0,24,-9.18,0,22.17,-9.18,-.25,22.17],
// 4 16 9.18 -.25 22.17 9.18 0 22.17 0 0 24 0 -.25 24
  [4,16,9.18,-.25,22.17,9.18,0,22.17,0,0,24,0,-.25,24],
// 4 16 16.97 -.25 16.97 16.97 0 16.97 9.18 0 22.17 9.18 -.25 22.17
  [4,16,16.97,-.25,16.97,16.97,0,16.97,9.18,0,22.17,9.18,-.25,22.17],
// 5 24 -16.97 -.25 -16.97 -16.97 0 -16.97 -9.18 0 -22.17 -20 0 -14
  [5,24,-16.97,-.25,-16.97,-16.97,0,-16.97,-9.18,0,-22.17,-20,0,-14],
// 5 24 -20 -.25 -14 -20 0 -14 -142 0 -14 -16.97 0 -16.97
  [5,24,-20,-.25,-14,-20,0,-14,-142,0,-14,-16.97,0,-16.97],
// 5 24 -142 -.25 -14 -142 0 -14 -164 0 8 -20 0 -14
  [5,24,-142,-.25,-14,-142,0,-14,-164,0,8,-20,0,-14],
// 5 24 -164 -.25 8 -164 0 8 -164 0 12 -142 0 -14
  [5,24,-164,-.25,8,-164,0,8,-164,0,12,-142,0,-14],
// 5 24 -164 -.25 12 -164 0 12 -162 0 14 -164 0 8
  [5,24,-164,-.25,12,-164,0,12,-162,0,14,-164,0,8],
// 5 24 -162 -.25 14 -162 0 14 -20 0 14 -164 0 12
  [5,24,-162,-.25,14,-162,0,14,-20,0,14,-164,0,12],
// 5 24 -20 -.25 14 -20 0 14 -16.97 0 16.97 -162 0 14
  [5,24,-20,-.25,14,-20,0,14,-16.97,0,16.97,-162,0,14],
// 5 24 -16.97 -.25 16.97 -16.97 0 16.97 -9.18 0 22.17 -20 0 14
  [5,24,-16.97,-.25,16.97,-16.97,0,16.97,-9.18,0,22.17,-20,0,14],
// 5 24 -9.18 -.25 22.17 -9.18 0 22.17 0 0 24 -16.97 0 16.97
  [5,24,-9.18,-.25,22.17,-9.18,0,22.17,0,0,24,-16.97,0,16.97],
// 5 24 0 -.25 24 0 0 24 9.18 0 22.17 -9.18 0 22.17
  [5,24,0,-.25,24,0,0,24,9.18,0,22.17,-9.18,0,22.17],
// 5 24 9.18 -.25 22.17 9.18 0 22.17 16.97 0 16.97 0 0 24
  [5,24,9.18,-.25,22.17,9.18,0,22.17,16.97,0,16.97,0,0,24],
// 5 24 16.97 -.25 16.97 16.97 0 16.97 20 0 14 9.18 0 22.17
  [5,24,16.97,-.25,16.97,16.97,0,16.97,20,0,14,9.18,0,22.17],
// 5 24 20 -.25 14 20 0 14 162 0 14 16.97 0 16.97
  [5,24,20,-.25,14,20,0,14,162,0,14,16.97,0,16.97],
// 5 24 162 -.25 14 162 0 14 164 0 12 20 0 14
  [5,24,162,-.25,14,162,0,14,164,0,12,20,0,14],
// 5 24 164 -.25 12 164 0 12 164 0 8 162 0 14
  [5,24,164,-.25,12,164,0,12,164,0,8,162,0,14],
// 5 24 164 -.25 8 164 0 8 142 0 -14 164 0 12
  [5,24,164,-.25,8,164,0,8,142,0,-14,164,0,12],
// 5 24 142 -.25 -14 142 0 -14 20 0 -14 164 0 8
  [5,24,142,-.25,-14,142,0,-14,20,0,-14,164,0,8],
// 5 24 20 -.25 -14 20 0 -14 16.97 0 -16.97 142 0 -14
  [5,24,20,-.25,-14,20,0,-14,16.97,0,-16.97,142,0,-14],
// 5 24 16.97 -.25 -16.97 16.97 0 -16.97 9.18 0 -22.17 20 0 -14
  [5,24,16.97,-.25,-16.97,16.97,0,-16.97,9.18,0,-22.17,20,0,-14],
// 5 24 9.18 -.25 -22.17 9.18 0 -22.17 0 0 -24 16.97 0 -16.97
  [5,24,9.18,-.25,-22.17,9.18,0,-22.17,0,0,-24,16.97,0,-16.97],
// 5 24 0 -.25 -24 0 0 -24 -9.18 0 -22.17 9.18 0 -22.17
  [5,24,0,-.25,-24,0,0,-24,-9.18,0,-22.17,9.18,0,-22.17],
// 5 24 -9.18 -.25 -22.17 -9.18 0 -22.17 -16.97 0 -16.97 0 0 -24
  [5,24,-9.18,-.25,-22.17,-9.18,0,-22.17,-16.97,0,-16.97,0,0,-24],
];
module ldraw_lib__197895a(step=0, col=false, unit=2/5, alt=false, line=0.2, solid=!$preview)
    makepoly(ldraw_lib__197895a(), step=step, col=col, unit=unit, alt=alt, line=line, solid=solid);
ldraw_lib__197895a(line=0.2);
